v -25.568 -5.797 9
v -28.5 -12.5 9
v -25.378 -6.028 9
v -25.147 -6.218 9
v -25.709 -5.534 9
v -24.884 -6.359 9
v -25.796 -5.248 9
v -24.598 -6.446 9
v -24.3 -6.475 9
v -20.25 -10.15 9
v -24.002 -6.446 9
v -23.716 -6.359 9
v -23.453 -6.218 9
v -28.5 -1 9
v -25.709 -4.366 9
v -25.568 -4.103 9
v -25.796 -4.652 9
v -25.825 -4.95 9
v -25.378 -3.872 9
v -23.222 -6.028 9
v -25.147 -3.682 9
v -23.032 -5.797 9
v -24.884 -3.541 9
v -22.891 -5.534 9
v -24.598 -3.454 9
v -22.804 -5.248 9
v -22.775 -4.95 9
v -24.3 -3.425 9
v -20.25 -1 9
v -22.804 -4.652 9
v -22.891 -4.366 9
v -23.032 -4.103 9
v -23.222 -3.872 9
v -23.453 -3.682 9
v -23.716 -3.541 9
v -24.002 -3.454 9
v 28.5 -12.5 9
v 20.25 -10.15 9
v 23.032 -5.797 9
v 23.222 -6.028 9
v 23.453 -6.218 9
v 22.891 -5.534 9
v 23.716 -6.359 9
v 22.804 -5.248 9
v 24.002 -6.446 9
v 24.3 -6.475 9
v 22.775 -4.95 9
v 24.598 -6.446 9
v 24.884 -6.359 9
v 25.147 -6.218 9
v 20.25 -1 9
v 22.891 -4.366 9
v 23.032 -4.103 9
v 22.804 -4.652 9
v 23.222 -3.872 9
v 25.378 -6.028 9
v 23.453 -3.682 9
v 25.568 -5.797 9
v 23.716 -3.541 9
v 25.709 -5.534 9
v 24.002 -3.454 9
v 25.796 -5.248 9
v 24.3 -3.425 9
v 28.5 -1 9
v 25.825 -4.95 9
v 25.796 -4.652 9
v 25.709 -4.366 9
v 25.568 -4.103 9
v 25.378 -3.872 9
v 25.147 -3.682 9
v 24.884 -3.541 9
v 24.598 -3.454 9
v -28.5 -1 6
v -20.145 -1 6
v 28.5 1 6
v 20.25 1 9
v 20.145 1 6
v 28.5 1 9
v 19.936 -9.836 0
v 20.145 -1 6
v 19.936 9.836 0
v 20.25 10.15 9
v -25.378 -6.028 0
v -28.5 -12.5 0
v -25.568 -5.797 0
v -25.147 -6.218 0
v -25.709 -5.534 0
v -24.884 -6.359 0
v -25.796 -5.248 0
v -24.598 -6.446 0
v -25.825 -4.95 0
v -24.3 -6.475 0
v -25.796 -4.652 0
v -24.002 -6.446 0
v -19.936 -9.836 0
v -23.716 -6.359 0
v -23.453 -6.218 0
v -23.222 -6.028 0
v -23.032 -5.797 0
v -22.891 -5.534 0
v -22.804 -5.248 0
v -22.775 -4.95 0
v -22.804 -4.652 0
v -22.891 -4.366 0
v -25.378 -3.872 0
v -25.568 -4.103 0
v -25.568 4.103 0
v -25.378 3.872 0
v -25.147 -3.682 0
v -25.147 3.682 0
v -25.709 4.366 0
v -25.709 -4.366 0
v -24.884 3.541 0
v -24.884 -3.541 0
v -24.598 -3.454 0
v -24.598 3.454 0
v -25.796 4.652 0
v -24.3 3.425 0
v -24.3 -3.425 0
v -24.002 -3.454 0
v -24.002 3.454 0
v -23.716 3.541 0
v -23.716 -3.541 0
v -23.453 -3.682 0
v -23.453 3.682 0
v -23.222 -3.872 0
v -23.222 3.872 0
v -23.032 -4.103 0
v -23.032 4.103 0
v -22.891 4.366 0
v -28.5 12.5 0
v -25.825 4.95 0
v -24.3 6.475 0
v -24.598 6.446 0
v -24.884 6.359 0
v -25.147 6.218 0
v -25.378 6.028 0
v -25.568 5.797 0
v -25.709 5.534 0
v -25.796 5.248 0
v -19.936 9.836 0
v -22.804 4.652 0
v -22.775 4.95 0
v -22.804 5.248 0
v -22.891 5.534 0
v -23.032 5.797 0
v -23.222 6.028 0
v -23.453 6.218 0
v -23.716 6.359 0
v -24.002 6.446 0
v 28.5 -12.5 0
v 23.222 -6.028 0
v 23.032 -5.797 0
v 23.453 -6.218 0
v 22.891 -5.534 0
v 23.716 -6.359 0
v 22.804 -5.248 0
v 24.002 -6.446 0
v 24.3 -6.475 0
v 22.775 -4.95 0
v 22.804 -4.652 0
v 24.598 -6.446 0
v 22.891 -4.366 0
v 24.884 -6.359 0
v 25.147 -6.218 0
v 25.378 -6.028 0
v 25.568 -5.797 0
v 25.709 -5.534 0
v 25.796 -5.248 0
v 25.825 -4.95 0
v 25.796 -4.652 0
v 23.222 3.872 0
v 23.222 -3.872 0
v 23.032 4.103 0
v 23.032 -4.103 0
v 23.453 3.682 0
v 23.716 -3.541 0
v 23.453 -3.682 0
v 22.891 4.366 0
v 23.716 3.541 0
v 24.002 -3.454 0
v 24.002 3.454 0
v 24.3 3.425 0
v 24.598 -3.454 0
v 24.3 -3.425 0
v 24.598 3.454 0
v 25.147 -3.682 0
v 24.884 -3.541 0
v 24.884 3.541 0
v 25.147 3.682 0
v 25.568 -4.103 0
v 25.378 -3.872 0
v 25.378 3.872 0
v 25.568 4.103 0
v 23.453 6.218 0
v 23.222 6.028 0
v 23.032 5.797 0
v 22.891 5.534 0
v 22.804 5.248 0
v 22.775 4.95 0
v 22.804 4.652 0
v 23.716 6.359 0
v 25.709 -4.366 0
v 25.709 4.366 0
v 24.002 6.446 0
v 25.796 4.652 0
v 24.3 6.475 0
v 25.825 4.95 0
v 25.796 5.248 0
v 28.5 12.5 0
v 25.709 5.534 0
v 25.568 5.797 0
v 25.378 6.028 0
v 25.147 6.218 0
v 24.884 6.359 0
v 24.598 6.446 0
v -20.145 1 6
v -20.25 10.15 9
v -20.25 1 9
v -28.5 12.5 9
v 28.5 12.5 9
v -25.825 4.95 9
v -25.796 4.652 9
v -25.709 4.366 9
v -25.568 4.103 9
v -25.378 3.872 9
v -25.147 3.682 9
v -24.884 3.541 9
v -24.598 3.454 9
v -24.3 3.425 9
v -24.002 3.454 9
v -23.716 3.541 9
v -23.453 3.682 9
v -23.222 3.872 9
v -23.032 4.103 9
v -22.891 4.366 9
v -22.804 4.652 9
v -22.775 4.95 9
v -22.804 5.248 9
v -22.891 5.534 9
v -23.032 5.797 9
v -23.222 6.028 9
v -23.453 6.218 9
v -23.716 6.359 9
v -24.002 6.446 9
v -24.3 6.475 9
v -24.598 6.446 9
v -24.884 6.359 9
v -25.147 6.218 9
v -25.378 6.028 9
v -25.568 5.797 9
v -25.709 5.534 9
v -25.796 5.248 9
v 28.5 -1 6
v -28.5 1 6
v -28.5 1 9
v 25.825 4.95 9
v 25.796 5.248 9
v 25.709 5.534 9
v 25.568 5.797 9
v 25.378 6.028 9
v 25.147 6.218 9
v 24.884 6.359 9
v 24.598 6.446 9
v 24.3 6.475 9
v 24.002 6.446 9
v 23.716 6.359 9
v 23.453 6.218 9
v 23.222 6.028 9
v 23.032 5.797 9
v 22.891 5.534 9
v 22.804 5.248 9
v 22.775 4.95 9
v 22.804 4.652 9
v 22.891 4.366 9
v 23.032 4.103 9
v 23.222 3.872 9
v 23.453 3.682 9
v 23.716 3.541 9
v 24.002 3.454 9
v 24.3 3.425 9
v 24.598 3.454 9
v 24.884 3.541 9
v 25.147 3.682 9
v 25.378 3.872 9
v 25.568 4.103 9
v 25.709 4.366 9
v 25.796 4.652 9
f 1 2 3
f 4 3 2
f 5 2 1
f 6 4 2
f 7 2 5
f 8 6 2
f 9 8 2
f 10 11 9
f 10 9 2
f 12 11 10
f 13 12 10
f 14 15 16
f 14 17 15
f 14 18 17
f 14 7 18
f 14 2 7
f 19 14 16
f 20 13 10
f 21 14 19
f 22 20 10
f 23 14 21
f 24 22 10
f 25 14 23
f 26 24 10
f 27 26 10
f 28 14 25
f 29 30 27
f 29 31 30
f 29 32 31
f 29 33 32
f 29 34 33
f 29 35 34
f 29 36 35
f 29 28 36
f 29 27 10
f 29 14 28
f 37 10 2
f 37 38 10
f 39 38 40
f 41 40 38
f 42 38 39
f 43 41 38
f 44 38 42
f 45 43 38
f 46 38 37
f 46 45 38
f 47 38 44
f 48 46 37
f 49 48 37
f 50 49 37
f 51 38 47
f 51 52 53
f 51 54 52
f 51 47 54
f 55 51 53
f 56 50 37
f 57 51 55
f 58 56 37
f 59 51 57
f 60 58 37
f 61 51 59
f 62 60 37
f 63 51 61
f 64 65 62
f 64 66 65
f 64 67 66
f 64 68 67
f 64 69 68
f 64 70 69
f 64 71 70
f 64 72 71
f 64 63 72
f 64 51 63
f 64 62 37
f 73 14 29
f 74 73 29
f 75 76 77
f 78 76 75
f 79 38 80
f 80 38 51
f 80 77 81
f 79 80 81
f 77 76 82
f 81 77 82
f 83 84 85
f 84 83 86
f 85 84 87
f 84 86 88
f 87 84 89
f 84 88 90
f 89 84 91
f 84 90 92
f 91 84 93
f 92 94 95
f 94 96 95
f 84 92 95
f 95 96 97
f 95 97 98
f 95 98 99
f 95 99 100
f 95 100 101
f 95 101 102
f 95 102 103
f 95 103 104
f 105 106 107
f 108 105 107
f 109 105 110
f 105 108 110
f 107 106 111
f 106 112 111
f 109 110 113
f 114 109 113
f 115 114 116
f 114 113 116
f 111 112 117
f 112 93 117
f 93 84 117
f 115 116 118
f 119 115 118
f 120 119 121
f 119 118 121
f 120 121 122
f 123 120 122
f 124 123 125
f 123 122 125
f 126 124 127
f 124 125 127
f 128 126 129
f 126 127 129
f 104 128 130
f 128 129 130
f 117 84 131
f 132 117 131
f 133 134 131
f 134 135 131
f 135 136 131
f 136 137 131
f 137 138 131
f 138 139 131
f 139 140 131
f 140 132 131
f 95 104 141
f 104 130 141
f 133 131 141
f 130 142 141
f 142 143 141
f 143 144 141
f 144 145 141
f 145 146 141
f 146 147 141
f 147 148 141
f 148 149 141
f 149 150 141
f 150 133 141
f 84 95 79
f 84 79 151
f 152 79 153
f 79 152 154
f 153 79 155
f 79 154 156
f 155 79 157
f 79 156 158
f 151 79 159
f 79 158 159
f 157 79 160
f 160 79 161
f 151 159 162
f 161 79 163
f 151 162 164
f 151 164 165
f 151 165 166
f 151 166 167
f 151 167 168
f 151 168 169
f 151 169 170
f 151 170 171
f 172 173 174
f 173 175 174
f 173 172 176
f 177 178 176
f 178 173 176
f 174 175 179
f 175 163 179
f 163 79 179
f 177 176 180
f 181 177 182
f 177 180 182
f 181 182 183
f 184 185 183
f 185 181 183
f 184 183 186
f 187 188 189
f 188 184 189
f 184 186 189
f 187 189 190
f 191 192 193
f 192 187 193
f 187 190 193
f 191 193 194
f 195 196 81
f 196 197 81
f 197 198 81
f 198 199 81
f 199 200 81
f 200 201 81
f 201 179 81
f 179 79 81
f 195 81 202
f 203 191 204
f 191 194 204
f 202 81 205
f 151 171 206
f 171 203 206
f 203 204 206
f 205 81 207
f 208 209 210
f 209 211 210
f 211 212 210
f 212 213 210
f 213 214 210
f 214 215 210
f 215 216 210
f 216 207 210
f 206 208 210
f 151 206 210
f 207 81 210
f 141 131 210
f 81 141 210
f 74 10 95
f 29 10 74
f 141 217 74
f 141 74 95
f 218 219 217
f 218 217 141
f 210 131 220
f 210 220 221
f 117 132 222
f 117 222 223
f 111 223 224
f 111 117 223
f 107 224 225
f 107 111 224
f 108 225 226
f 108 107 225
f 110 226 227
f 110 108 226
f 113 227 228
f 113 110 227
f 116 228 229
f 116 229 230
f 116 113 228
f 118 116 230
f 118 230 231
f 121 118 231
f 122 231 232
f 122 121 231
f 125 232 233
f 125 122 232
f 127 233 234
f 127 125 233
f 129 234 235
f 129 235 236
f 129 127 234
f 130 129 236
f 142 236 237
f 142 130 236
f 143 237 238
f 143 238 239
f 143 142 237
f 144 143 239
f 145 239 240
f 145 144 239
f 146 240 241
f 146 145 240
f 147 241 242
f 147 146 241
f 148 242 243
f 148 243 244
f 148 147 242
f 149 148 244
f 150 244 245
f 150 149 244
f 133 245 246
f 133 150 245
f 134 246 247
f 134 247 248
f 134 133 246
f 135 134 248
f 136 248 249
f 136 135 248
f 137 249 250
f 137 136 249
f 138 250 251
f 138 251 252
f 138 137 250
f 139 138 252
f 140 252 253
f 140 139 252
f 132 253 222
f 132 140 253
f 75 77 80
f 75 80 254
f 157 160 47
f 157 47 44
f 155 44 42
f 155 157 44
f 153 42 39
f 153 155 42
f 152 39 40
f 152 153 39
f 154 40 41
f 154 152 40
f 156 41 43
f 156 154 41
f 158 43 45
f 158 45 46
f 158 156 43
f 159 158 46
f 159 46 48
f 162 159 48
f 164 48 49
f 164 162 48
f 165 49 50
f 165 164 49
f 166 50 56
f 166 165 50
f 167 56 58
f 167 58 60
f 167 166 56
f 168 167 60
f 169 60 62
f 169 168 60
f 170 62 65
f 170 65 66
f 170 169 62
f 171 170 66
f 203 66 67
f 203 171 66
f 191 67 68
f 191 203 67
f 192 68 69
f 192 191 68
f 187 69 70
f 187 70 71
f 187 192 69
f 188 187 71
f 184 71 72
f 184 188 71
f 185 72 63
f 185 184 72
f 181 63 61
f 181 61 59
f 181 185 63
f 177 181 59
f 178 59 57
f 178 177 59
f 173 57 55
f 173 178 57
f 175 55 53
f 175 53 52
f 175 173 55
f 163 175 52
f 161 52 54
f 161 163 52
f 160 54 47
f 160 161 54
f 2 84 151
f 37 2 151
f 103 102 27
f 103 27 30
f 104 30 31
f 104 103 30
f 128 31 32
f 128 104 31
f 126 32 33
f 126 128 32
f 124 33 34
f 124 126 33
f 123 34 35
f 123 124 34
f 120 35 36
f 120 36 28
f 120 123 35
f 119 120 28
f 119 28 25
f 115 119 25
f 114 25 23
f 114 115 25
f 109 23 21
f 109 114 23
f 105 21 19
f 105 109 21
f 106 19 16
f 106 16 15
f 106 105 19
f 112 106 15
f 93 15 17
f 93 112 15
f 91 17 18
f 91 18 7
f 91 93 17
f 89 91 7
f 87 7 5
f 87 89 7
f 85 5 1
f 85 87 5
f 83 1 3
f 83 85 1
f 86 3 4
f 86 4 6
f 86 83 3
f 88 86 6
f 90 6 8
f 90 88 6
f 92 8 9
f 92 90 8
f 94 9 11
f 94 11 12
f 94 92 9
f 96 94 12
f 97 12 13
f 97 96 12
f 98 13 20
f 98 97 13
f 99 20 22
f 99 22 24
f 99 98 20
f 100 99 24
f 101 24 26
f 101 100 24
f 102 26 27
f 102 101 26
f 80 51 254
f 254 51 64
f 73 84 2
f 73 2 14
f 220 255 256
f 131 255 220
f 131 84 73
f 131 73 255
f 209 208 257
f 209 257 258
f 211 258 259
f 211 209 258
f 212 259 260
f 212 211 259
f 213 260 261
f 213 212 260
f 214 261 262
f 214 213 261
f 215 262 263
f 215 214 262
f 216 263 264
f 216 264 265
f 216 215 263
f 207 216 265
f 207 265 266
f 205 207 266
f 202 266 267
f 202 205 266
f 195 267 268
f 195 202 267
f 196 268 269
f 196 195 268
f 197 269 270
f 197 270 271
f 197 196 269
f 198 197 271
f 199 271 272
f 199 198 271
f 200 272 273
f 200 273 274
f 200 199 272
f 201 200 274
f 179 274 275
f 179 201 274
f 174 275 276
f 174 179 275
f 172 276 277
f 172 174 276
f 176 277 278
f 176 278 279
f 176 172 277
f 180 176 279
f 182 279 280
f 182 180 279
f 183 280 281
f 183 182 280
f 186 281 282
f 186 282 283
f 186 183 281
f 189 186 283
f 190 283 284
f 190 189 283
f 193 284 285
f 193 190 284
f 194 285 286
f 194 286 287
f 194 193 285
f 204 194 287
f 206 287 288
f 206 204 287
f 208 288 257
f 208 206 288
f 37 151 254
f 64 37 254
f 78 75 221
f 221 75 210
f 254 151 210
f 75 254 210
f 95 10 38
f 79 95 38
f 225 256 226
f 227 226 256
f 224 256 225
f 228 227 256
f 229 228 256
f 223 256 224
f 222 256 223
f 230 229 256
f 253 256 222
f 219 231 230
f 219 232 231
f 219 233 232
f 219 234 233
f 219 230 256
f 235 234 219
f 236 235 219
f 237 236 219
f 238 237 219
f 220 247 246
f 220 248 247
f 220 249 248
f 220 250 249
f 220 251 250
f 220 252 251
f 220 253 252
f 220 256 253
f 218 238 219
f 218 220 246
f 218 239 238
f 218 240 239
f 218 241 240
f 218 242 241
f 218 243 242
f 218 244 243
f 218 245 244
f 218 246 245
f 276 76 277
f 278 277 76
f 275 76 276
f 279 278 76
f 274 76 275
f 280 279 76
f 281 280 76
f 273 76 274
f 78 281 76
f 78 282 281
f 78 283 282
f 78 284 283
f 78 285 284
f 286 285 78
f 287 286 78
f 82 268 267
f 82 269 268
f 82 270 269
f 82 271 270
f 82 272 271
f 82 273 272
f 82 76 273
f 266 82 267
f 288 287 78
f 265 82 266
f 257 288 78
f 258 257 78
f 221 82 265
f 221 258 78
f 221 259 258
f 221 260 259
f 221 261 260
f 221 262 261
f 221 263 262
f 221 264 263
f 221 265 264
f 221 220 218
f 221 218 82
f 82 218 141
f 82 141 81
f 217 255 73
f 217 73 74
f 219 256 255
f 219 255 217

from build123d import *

# Parameters (mm, degrees)
SKETCH_1_W          = 57
SKETCH_1_H          = 25
SKETCH_1_R          = 1.525
EXTRUDE_1_DEPTH     = 9
SKETCH_2_W          = 57
SKETCH_2_H          = 2
CUT_EXTRUDE_1_DEPTH = 3
SKETCH_3_W          = 40.5
SKETCH_3_H          = 20.3
CUT_EXTRUDE_2_DEPTH = 15
CUT_EXTRUDE_2_DRAFT = -2


with BuildPart() as part:
    # 草图1 → 凸台-拉伸1 (new body)
    with BuildSketch(Plane.XY):
        Rectangle(SKETCH_1_W, SKETCH_1_H)
        with Locations((24.3, 4.95)):
            Circle(SKETCH_1_R, mode=Mode.SUBTRACT)
        with Locations(Location((-24.3, 4.95, 0), (0, 0, 180))):
            Circle(SKETCH_1_R, mode=Mode.SUBTRACT)
        with Locations((-24.3, -4.95)):
            Circle(SKETCH_1_R, mode=Mode.SUBTRACT)
        with Locations(Location((24.3, -4.95, 0), (0, 0, 180))):
            Circle(SKETCH_1_R, mode=Mode.SUBTRACT)
    extrude(amount=EXTRUDE_1_DEPTH)

    # 草图2 → 切除-拉伸1 (cut)
    with BuildSketch(Plane.XY.offset(9)):
        Rectangle(SKETCH_2_W, SKETCH_2_H)
    extrude(amount=-CUT_EXTRUDE_1_DEPTH, mode=Mode.SUBTRACT)


with BuildPart() as cut_extrude_2_tool:
    # 草图3 → 切除-拉伸2 (with draft: the straight prism first)
    with BuildSketch(Plane.XY.offset(9)):
        Rectangle(SKETCH_3_W, SKETCH_3_H)
    extrude(amount=-CUT_EXTRUDE_2_DEPTH)
    # 切除-拉伸2: the draft: its side faces are tilted about the plane it starts from
    cut_extrude_2_sides = [cut_extrude_2_tool.faces().sort_by_distance(p)[0] for p in [
        (0, -10.15, 1.5),
        (20.25, 0, 1.5),
        (0, 10.15, 1.5),
        (-20.25, 0, 1.5),
    ]]
    draft(cut_extrude_2_sides, Plane.XY.offset(9), CUT_EXTRUDE_2_DRAFT)


with BuildPart() as part_1:
    add(part.part)

    # 切除-拉伸2: cut by cut_extrude_2_tool
    add(cut_extrude_2_tool.part, mode=Mode.SUBTRACT)


solid = part_1.part
